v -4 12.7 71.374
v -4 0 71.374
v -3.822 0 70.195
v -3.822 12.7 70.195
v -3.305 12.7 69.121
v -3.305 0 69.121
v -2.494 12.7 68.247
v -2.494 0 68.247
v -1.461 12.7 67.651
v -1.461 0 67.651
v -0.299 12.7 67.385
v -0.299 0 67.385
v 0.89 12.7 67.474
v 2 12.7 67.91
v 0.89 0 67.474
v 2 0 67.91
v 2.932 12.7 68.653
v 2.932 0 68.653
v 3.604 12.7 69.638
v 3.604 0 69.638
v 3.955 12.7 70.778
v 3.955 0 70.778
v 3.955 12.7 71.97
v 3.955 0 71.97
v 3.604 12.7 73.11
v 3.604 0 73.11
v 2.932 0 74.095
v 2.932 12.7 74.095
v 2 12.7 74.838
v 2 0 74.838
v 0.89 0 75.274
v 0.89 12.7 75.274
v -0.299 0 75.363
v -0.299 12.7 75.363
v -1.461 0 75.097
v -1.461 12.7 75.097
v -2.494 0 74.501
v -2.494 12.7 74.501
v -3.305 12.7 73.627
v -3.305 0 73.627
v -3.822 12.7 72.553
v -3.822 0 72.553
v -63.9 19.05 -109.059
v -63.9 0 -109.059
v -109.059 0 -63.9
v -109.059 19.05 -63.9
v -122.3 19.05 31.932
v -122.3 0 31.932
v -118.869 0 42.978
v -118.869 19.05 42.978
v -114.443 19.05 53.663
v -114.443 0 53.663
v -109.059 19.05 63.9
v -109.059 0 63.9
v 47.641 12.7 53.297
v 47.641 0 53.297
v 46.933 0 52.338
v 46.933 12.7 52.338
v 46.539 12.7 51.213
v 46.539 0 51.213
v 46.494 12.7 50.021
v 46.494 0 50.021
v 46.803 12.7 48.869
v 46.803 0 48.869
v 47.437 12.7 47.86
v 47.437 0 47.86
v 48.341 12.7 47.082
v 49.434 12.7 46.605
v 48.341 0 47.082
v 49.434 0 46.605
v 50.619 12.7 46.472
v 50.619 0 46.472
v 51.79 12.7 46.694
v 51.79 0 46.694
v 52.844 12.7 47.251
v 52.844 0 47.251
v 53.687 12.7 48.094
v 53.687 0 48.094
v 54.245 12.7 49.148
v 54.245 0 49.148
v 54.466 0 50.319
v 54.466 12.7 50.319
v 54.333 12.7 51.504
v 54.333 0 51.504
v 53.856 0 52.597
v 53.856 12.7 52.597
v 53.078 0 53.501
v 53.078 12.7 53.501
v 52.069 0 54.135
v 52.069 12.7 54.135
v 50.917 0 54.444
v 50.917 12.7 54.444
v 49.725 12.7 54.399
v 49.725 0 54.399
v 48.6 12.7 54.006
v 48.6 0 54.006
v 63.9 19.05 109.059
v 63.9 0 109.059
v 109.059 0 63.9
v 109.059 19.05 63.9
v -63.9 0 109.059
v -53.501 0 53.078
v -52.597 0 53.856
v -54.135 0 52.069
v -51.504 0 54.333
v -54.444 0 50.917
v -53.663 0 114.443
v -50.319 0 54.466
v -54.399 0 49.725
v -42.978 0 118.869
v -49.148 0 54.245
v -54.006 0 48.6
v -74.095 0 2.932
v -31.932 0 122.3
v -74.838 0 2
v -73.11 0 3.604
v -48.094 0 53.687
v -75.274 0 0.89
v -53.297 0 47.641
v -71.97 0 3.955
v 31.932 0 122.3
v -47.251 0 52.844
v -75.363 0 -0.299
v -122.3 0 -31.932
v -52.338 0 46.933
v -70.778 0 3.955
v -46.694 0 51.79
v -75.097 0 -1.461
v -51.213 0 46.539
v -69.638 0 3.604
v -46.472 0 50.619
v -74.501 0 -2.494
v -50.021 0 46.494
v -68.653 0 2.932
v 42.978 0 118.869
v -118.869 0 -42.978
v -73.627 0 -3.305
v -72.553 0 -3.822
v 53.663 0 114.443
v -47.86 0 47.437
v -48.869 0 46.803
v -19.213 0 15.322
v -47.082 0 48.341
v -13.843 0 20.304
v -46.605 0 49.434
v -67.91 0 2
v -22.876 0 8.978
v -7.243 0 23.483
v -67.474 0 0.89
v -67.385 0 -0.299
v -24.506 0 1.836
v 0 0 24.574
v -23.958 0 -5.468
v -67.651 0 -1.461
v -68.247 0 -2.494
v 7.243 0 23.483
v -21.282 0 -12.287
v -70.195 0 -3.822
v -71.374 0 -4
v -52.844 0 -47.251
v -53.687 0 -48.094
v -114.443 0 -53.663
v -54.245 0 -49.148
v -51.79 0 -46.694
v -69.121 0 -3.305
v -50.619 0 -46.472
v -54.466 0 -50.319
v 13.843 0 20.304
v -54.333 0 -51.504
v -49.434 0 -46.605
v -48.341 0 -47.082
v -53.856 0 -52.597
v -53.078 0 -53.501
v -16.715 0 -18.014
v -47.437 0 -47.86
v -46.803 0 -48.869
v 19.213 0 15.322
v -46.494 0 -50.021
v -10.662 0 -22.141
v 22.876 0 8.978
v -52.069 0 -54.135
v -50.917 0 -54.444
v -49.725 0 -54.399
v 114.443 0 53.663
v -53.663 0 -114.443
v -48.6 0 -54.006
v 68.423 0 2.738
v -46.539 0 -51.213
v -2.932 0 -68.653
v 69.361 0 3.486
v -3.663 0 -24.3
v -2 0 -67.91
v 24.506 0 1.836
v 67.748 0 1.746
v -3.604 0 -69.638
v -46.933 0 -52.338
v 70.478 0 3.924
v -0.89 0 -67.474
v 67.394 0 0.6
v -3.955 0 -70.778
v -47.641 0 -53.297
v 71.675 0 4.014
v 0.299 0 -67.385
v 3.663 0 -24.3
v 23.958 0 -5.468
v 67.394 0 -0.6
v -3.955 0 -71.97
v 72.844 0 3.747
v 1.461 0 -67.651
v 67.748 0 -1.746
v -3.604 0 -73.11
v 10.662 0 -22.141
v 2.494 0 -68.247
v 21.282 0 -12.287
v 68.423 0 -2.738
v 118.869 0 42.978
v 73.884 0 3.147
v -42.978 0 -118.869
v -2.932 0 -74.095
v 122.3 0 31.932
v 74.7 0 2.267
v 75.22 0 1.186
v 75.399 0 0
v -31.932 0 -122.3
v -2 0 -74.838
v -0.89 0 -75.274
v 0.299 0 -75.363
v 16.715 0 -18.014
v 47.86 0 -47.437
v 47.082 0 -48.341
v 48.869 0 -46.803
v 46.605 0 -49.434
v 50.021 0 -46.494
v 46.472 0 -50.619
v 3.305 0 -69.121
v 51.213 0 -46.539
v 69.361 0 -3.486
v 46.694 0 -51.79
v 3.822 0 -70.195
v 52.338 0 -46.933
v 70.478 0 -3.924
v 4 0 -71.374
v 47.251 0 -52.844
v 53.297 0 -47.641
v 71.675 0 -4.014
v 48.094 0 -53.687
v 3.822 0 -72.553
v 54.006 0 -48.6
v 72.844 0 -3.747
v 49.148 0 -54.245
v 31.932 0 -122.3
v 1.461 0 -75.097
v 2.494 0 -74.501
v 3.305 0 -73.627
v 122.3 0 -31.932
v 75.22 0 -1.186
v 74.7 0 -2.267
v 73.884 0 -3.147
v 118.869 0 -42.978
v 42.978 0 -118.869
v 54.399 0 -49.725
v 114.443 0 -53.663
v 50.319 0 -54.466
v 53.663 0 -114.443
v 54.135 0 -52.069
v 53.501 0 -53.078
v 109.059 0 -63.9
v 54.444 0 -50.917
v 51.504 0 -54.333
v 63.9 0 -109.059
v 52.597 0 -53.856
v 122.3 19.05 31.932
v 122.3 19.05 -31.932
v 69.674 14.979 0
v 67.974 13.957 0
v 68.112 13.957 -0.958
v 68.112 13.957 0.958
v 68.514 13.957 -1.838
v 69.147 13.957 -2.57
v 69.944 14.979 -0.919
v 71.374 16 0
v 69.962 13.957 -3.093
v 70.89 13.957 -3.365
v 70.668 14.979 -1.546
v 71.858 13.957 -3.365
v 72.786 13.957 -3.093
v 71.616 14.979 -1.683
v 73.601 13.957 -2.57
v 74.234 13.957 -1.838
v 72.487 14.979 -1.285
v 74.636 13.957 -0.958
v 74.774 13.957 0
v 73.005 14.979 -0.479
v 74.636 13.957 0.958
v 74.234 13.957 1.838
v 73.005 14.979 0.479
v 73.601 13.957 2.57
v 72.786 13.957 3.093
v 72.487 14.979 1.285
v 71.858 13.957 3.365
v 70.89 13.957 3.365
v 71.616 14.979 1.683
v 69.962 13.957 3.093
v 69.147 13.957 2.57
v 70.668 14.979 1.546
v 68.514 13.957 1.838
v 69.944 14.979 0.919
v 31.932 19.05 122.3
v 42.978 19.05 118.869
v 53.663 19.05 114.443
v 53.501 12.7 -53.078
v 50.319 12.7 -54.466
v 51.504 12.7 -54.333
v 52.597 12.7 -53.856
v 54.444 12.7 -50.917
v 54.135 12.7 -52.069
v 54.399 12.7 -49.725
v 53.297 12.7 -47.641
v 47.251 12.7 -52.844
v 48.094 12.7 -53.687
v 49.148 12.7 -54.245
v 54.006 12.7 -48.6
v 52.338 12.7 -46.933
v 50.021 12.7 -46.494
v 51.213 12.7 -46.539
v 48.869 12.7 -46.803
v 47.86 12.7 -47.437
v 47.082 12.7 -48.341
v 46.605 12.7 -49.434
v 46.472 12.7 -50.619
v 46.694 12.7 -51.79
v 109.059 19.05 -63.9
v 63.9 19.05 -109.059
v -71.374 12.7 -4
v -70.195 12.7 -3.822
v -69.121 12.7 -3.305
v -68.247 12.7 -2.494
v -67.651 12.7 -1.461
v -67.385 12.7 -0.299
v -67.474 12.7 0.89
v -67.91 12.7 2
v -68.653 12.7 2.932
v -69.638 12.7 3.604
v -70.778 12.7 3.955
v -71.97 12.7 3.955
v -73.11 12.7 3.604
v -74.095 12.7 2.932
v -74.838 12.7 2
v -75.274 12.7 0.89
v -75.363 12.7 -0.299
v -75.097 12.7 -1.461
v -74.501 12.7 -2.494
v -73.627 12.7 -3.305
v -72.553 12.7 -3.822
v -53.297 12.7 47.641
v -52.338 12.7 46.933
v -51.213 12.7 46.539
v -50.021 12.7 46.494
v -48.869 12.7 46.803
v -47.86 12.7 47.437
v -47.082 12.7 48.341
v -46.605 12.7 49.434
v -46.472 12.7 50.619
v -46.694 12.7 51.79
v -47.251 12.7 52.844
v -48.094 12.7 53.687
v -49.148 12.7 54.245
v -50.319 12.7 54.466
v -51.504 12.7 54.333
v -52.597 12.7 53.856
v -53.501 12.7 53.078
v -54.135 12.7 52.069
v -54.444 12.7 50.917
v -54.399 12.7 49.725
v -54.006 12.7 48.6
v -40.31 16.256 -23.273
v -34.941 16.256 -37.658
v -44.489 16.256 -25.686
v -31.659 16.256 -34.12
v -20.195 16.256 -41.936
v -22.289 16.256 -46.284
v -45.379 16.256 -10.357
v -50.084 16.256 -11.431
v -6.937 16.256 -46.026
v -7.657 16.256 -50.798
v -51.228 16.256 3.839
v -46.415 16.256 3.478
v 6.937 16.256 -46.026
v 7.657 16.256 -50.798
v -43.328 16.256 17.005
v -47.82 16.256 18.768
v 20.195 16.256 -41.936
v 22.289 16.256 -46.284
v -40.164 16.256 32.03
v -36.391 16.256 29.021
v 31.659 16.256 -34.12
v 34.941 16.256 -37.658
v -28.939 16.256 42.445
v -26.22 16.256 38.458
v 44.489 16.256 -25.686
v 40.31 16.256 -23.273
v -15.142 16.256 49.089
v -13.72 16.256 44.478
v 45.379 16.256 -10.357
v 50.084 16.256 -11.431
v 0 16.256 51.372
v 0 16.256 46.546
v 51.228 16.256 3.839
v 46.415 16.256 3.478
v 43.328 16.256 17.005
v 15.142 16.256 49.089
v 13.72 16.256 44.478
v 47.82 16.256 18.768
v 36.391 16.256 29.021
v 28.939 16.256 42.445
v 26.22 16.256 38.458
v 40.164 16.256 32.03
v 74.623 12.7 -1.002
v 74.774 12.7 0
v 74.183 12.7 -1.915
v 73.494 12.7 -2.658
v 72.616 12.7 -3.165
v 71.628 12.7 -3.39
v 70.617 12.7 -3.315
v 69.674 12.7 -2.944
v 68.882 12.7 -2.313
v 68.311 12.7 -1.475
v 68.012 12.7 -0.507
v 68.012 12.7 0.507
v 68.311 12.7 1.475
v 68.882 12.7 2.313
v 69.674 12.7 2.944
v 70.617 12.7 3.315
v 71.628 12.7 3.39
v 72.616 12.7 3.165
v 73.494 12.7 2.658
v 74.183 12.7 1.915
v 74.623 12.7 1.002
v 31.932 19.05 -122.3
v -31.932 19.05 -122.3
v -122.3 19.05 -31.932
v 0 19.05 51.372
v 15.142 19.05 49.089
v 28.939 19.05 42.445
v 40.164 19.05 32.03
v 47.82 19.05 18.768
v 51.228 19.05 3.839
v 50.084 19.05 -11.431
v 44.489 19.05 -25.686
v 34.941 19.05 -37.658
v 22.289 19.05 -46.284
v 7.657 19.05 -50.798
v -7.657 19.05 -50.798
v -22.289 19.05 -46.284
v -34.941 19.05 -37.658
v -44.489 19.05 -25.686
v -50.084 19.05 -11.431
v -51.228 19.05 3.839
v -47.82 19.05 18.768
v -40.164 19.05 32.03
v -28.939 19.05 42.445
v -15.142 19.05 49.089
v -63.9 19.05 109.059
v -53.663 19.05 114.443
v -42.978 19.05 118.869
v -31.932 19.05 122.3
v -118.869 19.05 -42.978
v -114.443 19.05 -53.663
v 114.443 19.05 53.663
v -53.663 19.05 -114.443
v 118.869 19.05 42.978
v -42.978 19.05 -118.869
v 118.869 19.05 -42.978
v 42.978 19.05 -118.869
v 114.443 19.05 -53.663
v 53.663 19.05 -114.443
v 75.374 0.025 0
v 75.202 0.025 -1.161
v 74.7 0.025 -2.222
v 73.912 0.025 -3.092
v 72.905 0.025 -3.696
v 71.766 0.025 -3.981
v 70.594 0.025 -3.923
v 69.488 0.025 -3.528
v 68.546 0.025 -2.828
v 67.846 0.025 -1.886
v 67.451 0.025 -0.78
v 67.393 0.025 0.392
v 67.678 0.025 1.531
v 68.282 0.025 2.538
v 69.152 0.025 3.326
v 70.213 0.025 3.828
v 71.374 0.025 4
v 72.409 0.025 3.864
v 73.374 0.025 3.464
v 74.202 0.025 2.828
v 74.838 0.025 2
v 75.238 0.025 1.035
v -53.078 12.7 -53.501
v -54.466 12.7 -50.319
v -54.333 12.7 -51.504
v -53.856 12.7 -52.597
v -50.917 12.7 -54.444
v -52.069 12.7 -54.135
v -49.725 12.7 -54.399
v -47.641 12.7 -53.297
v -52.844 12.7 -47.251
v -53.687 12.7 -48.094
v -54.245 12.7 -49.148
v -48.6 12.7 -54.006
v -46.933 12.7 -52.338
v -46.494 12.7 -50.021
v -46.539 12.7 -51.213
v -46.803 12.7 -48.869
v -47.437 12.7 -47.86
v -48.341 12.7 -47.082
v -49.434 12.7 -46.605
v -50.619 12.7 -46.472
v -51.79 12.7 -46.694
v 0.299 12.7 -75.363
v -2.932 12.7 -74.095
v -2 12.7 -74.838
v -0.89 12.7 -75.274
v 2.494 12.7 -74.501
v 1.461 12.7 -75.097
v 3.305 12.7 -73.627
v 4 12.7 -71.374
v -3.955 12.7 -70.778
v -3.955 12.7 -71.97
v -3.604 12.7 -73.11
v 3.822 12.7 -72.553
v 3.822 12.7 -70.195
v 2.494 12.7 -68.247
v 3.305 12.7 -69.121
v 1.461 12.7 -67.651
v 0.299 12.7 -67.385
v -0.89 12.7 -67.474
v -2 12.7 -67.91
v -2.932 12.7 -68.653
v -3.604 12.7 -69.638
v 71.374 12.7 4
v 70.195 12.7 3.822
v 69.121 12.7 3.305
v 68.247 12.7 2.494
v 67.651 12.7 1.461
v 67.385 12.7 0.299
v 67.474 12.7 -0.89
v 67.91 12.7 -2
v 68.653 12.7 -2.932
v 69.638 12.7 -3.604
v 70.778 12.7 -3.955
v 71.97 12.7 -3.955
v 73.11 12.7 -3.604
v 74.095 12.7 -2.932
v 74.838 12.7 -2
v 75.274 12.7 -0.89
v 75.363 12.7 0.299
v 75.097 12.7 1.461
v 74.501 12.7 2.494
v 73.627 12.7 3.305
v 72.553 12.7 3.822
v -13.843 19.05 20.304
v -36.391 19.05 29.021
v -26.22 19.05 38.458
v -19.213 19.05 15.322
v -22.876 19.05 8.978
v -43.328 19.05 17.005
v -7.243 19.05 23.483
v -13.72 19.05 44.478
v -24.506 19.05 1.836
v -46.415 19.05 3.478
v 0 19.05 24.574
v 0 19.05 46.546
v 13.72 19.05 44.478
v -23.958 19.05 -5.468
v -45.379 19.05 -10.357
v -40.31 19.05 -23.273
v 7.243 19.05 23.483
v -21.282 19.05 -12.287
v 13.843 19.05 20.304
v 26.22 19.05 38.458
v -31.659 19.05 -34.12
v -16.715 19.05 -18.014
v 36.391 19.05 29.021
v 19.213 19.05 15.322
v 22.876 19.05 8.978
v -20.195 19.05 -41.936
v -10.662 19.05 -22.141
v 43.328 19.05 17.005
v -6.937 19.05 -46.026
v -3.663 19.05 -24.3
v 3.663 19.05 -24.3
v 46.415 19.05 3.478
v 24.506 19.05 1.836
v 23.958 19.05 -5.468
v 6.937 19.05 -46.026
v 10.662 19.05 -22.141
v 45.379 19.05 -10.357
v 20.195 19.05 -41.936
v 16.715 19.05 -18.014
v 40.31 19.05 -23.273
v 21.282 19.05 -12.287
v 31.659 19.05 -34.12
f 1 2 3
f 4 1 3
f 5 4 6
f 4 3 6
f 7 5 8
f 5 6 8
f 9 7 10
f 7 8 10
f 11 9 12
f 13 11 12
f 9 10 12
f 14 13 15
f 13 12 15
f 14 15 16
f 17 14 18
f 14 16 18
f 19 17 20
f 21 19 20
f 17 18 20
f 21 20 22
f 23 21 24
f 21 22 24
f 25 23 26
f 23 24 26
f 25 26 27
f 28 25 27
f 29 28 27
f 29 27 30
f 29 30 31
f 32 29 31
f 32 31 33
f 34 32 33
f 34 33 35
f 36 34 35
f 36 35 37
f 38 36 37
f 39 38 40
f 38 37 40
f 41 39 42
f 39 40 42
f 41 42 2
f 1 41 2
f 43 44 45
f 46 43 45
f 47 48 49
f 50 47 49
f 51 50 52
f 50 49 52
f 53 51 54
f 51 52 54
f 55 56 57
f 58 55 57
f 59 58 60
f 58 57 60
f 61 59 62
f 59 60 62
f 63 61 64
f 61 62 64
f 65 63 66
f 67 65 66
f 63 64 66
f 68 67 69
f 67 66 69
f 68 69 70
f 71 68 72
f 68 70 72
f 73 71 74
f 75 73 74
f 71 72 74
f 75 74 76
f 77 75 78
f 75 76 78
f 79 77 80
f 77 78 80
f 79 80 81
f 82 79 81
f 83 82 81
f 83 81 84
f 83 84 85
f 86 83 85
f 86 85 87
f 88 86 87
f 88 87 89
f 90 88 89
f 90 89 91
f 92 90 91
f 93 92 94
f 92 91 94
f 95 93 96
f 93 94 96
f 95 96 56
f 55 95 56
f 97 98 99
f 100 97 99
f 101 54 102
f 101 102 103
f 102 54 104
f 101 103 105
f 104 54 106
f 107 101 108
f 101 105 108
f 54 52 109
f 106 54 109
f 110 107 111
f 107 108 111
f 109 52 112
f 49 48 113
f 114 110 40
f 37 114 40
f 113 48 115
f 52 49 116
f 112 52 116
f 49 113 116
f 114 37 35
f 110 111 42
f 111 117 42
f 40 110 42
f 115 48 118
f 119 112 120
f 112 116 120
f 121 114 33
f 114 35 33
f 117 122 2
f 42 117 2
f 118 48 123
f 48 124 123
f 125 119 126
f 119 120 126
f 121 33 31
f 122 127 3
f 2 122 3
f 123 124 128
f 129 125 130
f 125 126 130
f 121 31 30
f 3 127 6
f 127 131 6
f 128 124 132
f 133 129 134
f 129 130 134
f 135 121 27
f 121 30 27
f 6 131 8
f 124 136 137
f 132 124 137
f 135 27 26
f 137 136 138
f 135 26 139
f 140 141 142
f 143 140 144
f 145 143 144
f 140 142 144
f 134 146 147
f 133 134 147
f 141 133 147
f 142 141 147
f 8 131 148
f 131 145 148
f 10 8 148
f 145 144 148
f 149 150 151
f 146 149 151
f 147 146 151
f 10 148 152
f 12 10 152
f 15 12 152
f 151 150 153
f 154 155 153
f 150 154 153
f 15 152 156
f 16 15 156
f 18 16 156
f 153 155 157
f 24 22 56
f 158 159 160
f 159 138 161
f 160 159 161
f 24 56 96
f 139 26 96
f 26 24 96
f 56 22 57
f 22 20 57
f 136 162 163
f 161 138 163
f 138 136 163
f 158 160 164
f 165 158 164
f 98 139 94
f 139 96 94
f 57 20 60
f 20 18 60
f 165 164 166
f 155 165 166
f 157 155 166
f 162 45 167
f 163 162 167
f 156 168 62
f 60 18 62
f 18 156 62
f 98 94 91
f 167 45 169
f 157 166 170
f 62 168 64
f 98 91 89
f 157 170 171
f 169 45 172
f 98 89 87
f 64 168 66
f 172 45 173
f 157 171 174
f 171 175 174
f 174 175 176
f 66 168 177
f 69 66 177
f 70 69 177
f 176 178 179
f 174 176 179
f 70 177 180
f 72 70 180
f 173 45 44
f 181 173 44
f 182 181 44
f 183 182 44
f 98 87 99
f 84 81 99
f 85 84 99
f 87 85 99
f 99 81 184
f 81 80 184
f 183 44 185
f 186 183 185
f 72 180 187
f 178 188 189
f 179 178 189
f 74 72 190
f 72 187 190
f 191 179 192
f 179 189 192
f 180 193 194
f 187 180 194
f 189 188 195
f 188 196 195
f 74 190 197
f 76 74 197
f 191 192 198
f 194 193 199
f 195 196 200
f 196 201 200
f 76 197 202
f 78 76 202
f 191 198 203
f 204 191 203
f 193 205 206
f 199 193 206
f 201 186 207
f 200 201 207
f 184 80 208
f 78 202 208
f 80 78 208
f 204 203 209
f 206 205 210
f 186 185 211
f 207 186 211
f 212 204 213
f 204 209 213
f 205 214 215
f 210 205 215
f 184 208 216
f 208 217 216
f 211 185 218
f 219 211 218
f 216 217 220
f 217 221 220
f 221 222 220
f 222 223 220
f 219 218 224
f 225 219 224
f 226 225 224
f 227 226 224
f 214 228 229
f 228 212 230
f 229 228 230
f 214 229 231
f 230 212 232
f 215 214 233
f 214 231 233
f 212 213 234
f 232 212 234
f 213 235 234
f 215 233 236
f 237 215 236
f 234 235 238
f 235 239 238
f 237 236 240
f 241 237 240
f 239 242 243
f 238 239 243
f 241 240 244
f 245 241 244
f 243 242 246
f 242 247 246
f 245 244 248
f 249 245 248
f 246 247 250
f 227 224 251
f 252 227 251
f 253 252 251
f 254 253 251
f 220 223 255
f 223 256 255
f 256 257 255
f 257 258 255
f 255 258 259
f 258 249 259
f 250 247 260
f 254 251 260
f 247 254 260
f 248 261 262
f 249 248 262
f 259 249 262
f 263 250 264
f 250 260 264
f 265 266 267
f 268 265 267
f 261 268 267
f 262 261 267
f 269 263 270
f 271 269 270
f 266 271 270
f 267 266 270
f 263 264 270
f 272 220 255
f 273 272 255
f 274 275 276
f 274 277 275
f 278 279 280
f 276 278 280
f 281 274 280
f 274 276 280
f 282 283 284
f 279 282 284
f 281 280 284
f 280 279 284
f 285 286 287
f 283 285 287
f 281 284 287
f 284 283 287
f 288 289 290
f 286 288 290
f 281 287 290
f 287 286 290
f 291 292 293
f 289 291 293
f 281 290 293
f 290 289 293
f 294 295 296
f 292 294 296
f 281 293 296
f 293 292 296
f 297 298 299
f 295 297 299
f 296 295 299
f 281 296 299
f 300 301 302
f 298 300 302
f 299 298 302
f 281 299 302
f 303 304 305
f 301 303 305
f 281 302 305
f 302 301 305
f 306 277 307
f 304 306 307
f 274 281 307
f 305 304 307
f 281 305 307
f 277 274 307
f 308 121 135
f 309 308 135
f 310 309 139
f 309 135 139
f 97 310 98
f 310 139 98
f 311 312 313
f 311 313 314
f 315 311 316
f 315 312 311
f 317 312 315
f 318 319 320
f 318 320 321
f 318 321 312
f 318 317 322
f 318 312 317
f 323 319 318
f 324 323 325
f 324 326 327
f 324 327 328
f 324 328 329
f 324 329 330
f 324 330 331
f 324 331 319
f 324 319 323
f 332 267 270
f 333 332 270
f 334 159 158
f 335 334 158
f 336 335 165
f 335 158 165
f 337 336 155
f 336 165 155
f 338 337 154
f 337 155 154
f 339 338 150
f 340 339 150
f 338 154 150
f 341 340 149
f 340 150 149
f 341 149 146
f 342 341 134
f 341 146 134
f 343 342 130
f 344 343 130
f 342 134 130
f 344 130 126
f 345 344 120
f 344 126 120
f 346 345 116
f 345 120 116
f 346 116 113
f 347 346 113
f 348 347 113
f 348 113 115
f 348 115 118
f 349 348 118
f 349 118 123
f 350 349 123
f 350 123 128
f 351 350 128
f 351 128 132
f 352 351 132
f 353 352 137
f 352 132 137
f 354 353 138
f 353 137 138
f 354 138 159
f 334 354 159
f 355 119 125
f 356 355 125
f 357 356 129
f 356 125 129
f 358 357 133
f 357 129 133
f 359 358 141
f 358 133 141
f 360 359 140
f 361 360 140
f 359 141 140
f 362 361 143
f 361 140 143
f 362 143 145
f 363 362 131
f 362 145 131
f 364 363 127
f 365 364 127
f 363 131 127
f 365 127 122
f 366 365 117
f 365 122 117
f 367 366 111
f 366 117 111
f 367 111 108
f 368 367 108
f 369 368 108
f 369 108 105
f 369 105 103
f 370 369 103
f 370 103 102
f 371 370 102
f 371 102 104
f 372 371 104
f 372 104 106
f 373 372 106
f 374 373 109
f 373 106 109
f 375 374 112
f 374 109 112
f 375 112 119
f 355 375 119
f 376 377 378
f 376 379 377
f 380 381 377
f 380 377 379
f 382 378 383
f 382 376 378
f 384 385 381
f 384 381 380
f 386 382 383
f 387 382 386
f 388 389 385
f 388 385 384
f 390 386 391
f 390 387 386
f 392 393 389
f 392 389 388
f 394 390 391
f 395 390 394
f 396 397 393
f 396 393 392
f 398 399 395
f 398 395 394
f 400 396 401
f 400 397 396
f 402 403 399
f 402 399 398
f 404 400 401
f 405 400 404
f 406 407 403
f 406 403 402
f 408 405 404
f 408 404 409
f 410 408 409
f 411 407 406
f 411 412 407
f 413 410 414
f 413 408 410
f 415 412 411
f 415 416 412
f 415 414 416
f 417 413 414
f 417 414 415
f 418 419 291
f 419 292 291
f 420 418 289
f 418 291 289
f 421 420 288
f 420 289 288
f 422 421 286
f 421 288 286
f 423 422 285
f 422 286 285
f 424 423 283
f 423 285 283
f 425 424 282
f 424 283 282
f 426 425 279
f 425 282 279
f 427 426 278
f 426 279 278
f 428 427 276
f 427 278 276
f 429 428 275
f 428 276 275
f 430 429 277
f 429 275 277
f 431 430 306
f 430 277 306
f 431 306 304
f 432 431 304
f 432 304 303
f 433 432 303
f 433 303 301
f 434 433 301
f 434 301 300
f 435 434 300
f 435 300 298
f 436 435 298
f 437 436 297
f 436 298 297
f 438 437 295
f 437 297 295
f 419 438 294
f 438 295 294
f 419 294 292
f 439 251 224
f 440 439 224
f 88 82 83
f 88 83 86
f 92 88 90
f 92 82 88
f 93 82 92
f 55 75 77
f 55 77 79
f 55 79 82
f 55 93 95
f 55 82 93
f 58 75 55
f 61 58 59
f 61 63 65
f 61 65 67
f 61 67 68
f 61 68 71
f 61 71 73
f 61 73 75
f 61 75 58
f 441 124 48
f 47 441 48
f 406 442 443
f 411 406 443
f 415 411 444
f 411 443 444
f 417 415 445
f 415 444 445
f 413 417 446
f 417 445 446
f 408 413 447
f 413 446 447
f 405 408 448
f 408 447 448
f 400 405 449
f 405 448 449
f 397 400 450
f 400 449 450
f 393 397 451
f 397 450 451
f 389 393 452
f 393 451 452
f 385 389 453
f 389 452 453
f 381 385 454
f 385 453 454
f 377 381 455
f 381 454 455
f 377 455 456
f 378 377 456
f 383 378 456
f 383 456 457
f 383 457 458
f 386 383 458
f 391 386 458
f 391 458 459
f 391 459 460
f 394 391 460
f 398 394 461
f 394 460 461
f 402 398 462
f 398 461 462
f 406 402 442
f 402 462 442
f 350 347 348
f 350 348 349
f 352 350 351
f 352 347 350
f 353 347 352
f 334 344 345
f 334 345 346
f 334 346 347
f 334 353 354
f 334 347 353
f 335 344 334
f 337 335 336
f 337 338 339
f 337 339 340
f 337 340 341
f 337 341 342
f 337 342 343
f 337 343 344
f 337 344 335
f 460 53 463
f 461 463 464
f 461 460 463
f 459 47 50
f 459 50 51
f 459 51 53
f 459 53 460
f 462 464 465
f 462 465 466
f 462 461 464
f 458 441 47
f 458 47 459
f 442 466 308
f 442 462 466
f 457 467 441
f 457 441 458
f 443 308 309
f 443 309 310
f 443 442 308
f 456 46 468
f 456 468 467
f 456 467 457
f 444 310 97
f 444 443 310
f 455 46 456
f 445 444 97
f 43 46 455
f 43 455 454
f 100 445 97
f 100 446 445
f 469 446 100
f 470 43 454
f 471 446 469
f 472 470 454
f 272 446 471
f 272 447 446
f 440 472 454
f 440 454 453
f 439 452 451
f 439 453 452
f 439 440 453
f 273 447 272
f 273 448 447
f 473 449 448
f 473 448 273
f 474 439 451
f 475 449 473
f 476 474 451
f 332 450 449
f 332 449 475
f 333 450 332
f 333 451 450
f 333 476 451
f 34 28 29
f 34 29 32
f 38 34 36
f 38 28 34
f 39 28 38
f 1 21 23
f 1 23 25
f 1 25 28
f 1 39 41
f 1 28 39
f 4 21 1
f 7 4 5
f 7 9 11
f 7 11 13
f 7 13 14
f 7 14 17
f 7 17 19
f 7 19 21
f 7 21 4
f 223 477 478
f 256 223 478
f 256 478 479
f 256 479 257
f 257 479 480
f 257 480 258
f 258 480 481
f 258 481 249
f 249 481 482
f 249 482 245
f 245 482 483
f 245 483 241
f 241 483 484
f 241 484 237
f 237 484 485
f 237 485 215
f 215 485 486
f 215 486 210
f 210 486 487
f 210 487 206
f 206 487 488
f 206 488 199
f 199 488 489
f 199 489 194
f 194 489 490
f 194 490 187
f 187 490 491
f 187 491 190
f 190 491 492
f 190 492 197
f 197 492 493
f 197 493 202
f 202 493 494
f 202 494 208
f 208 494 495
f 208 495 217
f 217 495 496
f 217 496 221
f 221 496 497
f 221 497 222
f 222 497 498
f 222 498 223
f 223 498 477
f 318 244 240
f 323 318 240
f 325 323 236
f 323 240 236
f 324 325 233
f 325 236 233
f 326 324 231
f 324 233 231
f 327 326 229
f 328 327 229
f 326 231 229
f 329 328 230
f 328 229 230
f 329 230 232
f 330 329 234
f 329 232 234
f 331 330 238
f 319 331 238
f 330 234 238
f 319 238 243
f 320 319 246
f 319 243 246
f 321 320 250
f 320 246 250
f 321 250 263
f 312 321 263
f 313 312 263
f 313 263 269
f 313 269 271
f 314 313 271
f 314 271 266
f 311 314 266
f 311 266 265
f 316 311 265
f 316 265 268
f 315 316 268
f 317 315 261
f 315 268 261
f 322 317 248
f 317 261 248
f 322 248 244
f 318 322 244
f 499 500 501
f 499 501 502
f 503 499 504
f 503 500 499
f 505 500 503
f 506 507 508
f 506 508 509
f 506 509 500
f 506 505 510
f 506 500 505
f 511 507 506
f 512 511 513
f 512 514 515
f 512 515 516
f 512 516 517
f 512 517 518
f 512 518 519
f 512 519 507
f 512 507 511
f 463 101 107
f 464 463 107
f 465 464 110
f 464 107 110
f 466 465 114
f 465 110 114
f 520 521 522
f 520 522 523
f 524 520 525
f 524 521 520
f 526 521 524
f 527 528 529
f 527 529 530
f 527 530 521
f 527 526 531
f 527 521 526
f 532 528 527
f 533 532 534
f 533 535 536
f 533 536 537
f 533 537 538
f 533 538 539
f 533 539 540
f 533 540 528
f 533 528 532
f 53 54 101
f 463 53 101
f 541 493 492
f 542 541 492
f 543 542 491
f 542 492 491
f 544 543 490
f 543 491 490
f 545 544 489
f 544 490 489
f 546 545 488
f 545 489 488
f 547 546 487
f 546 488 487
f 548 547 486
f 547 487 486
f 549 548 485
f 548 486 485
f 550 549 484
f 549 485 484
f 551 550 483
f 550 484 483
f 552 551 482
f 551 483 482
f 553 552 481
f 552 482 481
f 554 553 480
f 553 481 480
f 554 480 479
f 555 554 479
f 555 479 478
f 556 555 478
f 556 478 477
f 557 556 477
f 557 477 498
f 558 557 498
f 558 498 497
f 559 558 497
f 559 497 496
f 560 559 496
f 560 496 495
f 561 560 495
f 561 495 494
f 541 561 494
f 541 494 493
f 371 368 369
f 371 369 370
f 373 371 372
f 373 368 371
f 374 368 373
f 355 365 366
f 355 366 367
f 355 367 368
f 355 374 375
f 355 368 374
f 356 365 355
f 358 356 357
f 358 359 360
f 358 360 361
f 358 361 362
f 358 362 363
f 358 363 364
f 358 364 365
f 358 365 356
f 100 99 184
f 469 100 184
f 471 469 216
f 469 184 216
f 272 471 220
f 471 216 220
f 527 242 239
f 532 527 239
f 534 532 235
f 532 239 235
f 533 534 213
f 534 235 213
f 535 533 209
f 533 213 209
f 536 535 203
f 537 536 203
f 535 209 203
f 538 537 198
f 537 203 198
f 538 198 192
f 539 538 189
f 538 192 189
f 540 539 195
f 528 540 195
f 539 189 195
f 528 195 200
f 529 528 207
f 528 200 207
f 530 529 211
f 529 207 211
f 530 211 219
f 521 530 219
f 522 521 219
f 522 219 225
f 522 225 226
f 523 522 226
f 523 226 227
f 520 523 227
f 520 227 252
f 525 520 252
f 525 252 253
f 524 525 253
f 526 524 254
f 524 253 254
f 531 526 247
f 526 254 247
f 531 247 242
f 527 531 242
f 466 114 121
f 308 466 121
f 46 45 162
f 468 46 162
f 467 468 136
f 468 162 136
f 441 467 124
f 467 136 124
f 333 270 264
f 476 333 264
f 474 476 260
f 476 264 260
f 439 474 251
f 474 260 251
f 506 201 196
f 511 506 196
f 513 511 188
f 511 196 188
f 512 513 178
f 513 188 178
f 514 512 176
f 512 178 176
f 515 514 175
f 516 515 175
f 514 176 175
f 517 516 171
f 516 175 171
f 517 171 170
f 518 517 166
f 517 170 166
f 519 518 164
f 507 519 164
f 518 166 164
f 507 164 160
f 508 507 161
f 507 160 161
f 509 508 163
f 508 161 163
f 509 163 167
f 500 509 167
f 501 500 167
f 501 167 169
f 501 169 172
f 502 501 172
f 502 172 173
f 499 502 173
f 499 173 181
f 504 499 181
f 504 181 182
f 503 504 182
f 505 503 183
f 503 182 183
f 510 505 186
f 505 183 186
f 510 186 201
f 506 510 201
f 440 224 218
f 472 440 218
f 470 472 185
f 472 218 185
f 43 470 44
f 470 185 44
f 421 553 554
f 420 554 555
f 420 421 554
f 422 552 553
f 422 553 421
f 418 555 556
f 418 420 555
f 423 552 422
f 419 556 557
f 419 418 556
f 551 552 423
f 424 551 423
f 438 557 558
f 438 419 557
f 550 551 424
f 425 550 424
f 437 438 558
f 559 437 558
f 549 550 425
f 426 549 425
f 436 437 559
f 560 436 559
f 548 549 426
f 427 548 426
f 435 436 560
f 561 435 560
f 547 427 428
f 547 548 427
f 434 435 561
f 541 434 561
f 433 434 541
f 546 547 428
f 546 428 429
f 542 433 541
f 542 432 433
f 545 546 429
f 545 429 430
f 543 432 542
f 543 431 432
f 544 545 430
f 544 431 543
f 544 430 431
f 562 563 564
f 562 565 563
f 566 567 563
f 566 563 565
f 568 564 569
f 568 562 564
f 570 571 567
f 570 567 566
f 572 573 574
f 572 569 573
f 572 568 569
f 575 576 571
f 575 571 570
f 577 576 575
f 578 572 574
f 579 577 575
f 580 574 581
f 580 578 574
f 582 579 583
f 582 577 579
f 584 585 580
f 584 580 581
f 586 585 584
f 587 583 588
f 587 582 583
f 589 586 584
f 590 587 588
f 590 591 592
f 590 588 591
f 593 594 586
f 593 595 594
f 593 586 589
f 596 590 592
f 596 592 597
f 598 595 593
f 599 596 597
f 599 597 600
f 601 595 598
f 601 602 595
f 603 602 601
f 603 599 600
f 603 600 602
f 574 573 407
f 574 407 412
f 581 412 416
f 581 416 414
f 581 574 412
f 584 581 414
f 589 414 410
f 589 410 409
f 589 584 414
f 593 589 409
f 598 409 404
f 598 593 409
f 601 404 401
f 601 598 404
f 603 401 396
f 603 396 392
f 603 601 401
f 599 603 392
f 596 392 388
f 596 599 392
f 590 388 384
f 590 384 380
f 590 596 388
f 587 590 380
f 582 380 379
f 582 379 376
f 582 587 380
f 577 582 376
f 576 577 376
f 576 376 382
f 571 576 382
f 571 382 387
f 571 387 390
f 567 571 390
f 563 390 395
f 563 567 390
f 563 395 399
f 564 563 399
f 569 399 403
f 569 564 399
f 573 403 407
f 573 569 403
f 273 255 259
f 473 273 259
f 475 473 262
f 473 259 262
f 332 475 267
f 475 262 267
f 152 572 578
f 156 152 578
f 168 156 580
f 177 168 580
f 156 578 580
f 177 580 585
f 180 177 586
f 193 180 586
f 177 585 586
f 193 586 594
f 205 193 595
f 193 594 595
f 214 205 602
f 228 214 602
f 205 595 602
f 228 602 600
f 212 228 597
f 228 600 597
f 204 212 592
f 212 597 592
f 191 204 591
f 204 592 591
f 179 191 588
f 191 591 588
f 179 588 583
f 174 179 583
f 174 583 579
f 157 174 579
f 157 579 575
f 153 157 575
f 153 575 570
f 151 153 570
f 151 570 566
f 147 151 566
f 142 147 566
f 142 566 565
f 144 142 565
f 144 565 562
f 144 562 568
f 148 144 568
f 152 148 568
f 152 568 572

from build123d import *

# Parameters (mm, degrees)
BOSS_EXTRUDE1_DEPTH         = 19.05
SKETCH3_R                   = 24.5745
CUT_EXTRUDE1_DEPTH          = 175.004260005
SKETCH5_R                   = 51.3715
SKETCH5_R_2                 = 46.5455
CUT_EXTRUDE2_DEPTH          = 2.794
SKETCH7_R                   = 4
CUT_EXTRUDE3_DEPTH          = 12.7
M8_TAPPED_HOLE1_D           = 6.8
M8_TAPPED_HOLE1_DEPTH       = 13.957067295
M8_TAPPED_HOLE1_CSINK_D     = 8.05
M8_TAPPED_HOLE1_CSINK_ANGLE = 90
M8_TAPPED_HOLE1_TIP         = 2.042926105
CIRPATTERN1_COUNT           = 8


with BuildPart() as part:
    # Sketch1 → Boss-Extrude1 (new body)
    with BuildSketch(Plane(origin=(0, 0, 0), x_dir=(1, 0, 0), z_dir=(0, 1, 0))):
        with BuildLine():
            ThreePointArc((-31.932272077, 122.3), (-48.371185851, 116.778372909), (-63.899633215, 109.058685463))
            Line((-63.899633215, 109.058685463), (-109.058685463, 63.899633215))
            ThreePointArc((-109.058685463, 63.899633215), (-116.778372909, 48.371185851), (-122.3, 31.932272077))
            Line((-122.3, 31.932272077), (-122.3, -31.932272077))
            ThreePointArc((-122.3, -31.932272077), (-116.778372909, -48.371185851), (-109.058685463, -63.899633215))
            Line((-109.058685463, -63.899633215), (-63.899633215, -109.058685463))
            ThreePointArc((-63.899633215, -109.058685463), (-48.371185851, -116.778372909), (-31.932272077, -122.3))
            Line((-31.932272077, -122.3), (31.932272077, -122.3))
            ThreePointArc((31.932272077, -122.3), (48.371185851, -116.778372909), (63.899633215, -109.058685463))
            Line((63.899633215, -109.058685463), (109.058685463, -63.899633215))
            ThreePointArc((109.058685463, -63.899633215), (116.778372909, -48.371185851), (122.3, -31.932272077))
            Line((122.3, -31.932272077), (122.3, 31.932272077))
            ThreePointArc((122.3, 31.932272077), (116.778372909, 48.371185851), (109.058685463, 63.899633215))
            Line((109.058685463, 63.899633215), (63.899633215, 109.058685463))
            ThreePointArc((63.899633215, 109.058685463), (48.371185851, 116.778372909), (31.932272077, 122.3))
            Line((31.932272077, 122.3), (-31.932272077, 122.3))
        make_face()
    extrude(amount=BOSS_EXTRUDE1_DEPTH)

    # Sketch3 → Cut-Extrude1 (cut, through all)
    with BuildSketch(Plane(origin=(0, 19.05, 0), x_dir=(1, 0, 0), z_dir=(0, 1, 0))):
        with Locations(Location((0, 0, 0), (0, 0, 270))):
            Circle(SKETCH3_R)
    extrude(amount=-CUT_EXTRUDE1_DEPTH, mode=Mode.SUBTRACT)

    # Sketch5 → Cut-Extrude2 (cut)
    with BuildSketch(Plane(origin=(0, 19.05, 0), x_dir=(1, 0, 0), z_dir=(0, 1, 0))):
        with Locations(Location((0, 0, 0), (0, 0, 270))):
            Circle(SKETCH5_R)
        with Locations(Location((0, 0, 0), (0, 0, 270))):
            Circle(SKETCH5_R_2, mode=Mode.SUBTRACT)
    extrude(amount=-CUT_EXTRUDE2_DEPTH, mode=Mode.SUBTRACT)

    # Sketch7 → Cut-Extrude3 (cut)
    with BuildSketch(Plane.XZ):
        with Locations(Location((-71.374, 0, 0), (0, 0, 270))):
            Circle(SKETCH7_R)
    cut_extrude3 = extrude(amount=-CUT_EXTRUDE3_DEPTH, mode=Mode.SUBTRACT)

    # M8 Tapped Hole1
    with Locations(Plane(origin=(0, 0, 0), x_dir=(-1, 0, 0), z_dir=(0, -1, 0))):
        with Locations((-71.374, 0)):
            CounterSinkHole(M8_TAPPED_HOLE1_D / 2, M8_TAPPED_HOLE1_CSINK_D / 2, depth=M8_TAPPED_HOLE1_DEPTH, counter_sink_angle=M8_TAPPED_HOLE1_CSINK_ANGLE)
            with Locations((0, 0, -(M8_TAPPED_HOLE1_DEPTH + M8_TAPPED_HOLE1_TIP / 2))):  # 118° drill point
                Cone(0, M8_TAPPED_HOLE1_D / 2, M8_TAPPED_HOLE1_TIP, mode=Mode.SUBTRACT)

    # CirPattern1: Cut-Extrude3 ×8 about axis
    cirpattern1_axis = Axis((0, 0, 0), (0, 1, 0))
    for i in range(1, CIRPATTERN1_COUNT):
        add(cut_extrude3.rotate(cirpattern1_axis, i * 360 / CIRPATTERN1_COUNT), mode=Mode.SUBTRACT)


solid = part.part
